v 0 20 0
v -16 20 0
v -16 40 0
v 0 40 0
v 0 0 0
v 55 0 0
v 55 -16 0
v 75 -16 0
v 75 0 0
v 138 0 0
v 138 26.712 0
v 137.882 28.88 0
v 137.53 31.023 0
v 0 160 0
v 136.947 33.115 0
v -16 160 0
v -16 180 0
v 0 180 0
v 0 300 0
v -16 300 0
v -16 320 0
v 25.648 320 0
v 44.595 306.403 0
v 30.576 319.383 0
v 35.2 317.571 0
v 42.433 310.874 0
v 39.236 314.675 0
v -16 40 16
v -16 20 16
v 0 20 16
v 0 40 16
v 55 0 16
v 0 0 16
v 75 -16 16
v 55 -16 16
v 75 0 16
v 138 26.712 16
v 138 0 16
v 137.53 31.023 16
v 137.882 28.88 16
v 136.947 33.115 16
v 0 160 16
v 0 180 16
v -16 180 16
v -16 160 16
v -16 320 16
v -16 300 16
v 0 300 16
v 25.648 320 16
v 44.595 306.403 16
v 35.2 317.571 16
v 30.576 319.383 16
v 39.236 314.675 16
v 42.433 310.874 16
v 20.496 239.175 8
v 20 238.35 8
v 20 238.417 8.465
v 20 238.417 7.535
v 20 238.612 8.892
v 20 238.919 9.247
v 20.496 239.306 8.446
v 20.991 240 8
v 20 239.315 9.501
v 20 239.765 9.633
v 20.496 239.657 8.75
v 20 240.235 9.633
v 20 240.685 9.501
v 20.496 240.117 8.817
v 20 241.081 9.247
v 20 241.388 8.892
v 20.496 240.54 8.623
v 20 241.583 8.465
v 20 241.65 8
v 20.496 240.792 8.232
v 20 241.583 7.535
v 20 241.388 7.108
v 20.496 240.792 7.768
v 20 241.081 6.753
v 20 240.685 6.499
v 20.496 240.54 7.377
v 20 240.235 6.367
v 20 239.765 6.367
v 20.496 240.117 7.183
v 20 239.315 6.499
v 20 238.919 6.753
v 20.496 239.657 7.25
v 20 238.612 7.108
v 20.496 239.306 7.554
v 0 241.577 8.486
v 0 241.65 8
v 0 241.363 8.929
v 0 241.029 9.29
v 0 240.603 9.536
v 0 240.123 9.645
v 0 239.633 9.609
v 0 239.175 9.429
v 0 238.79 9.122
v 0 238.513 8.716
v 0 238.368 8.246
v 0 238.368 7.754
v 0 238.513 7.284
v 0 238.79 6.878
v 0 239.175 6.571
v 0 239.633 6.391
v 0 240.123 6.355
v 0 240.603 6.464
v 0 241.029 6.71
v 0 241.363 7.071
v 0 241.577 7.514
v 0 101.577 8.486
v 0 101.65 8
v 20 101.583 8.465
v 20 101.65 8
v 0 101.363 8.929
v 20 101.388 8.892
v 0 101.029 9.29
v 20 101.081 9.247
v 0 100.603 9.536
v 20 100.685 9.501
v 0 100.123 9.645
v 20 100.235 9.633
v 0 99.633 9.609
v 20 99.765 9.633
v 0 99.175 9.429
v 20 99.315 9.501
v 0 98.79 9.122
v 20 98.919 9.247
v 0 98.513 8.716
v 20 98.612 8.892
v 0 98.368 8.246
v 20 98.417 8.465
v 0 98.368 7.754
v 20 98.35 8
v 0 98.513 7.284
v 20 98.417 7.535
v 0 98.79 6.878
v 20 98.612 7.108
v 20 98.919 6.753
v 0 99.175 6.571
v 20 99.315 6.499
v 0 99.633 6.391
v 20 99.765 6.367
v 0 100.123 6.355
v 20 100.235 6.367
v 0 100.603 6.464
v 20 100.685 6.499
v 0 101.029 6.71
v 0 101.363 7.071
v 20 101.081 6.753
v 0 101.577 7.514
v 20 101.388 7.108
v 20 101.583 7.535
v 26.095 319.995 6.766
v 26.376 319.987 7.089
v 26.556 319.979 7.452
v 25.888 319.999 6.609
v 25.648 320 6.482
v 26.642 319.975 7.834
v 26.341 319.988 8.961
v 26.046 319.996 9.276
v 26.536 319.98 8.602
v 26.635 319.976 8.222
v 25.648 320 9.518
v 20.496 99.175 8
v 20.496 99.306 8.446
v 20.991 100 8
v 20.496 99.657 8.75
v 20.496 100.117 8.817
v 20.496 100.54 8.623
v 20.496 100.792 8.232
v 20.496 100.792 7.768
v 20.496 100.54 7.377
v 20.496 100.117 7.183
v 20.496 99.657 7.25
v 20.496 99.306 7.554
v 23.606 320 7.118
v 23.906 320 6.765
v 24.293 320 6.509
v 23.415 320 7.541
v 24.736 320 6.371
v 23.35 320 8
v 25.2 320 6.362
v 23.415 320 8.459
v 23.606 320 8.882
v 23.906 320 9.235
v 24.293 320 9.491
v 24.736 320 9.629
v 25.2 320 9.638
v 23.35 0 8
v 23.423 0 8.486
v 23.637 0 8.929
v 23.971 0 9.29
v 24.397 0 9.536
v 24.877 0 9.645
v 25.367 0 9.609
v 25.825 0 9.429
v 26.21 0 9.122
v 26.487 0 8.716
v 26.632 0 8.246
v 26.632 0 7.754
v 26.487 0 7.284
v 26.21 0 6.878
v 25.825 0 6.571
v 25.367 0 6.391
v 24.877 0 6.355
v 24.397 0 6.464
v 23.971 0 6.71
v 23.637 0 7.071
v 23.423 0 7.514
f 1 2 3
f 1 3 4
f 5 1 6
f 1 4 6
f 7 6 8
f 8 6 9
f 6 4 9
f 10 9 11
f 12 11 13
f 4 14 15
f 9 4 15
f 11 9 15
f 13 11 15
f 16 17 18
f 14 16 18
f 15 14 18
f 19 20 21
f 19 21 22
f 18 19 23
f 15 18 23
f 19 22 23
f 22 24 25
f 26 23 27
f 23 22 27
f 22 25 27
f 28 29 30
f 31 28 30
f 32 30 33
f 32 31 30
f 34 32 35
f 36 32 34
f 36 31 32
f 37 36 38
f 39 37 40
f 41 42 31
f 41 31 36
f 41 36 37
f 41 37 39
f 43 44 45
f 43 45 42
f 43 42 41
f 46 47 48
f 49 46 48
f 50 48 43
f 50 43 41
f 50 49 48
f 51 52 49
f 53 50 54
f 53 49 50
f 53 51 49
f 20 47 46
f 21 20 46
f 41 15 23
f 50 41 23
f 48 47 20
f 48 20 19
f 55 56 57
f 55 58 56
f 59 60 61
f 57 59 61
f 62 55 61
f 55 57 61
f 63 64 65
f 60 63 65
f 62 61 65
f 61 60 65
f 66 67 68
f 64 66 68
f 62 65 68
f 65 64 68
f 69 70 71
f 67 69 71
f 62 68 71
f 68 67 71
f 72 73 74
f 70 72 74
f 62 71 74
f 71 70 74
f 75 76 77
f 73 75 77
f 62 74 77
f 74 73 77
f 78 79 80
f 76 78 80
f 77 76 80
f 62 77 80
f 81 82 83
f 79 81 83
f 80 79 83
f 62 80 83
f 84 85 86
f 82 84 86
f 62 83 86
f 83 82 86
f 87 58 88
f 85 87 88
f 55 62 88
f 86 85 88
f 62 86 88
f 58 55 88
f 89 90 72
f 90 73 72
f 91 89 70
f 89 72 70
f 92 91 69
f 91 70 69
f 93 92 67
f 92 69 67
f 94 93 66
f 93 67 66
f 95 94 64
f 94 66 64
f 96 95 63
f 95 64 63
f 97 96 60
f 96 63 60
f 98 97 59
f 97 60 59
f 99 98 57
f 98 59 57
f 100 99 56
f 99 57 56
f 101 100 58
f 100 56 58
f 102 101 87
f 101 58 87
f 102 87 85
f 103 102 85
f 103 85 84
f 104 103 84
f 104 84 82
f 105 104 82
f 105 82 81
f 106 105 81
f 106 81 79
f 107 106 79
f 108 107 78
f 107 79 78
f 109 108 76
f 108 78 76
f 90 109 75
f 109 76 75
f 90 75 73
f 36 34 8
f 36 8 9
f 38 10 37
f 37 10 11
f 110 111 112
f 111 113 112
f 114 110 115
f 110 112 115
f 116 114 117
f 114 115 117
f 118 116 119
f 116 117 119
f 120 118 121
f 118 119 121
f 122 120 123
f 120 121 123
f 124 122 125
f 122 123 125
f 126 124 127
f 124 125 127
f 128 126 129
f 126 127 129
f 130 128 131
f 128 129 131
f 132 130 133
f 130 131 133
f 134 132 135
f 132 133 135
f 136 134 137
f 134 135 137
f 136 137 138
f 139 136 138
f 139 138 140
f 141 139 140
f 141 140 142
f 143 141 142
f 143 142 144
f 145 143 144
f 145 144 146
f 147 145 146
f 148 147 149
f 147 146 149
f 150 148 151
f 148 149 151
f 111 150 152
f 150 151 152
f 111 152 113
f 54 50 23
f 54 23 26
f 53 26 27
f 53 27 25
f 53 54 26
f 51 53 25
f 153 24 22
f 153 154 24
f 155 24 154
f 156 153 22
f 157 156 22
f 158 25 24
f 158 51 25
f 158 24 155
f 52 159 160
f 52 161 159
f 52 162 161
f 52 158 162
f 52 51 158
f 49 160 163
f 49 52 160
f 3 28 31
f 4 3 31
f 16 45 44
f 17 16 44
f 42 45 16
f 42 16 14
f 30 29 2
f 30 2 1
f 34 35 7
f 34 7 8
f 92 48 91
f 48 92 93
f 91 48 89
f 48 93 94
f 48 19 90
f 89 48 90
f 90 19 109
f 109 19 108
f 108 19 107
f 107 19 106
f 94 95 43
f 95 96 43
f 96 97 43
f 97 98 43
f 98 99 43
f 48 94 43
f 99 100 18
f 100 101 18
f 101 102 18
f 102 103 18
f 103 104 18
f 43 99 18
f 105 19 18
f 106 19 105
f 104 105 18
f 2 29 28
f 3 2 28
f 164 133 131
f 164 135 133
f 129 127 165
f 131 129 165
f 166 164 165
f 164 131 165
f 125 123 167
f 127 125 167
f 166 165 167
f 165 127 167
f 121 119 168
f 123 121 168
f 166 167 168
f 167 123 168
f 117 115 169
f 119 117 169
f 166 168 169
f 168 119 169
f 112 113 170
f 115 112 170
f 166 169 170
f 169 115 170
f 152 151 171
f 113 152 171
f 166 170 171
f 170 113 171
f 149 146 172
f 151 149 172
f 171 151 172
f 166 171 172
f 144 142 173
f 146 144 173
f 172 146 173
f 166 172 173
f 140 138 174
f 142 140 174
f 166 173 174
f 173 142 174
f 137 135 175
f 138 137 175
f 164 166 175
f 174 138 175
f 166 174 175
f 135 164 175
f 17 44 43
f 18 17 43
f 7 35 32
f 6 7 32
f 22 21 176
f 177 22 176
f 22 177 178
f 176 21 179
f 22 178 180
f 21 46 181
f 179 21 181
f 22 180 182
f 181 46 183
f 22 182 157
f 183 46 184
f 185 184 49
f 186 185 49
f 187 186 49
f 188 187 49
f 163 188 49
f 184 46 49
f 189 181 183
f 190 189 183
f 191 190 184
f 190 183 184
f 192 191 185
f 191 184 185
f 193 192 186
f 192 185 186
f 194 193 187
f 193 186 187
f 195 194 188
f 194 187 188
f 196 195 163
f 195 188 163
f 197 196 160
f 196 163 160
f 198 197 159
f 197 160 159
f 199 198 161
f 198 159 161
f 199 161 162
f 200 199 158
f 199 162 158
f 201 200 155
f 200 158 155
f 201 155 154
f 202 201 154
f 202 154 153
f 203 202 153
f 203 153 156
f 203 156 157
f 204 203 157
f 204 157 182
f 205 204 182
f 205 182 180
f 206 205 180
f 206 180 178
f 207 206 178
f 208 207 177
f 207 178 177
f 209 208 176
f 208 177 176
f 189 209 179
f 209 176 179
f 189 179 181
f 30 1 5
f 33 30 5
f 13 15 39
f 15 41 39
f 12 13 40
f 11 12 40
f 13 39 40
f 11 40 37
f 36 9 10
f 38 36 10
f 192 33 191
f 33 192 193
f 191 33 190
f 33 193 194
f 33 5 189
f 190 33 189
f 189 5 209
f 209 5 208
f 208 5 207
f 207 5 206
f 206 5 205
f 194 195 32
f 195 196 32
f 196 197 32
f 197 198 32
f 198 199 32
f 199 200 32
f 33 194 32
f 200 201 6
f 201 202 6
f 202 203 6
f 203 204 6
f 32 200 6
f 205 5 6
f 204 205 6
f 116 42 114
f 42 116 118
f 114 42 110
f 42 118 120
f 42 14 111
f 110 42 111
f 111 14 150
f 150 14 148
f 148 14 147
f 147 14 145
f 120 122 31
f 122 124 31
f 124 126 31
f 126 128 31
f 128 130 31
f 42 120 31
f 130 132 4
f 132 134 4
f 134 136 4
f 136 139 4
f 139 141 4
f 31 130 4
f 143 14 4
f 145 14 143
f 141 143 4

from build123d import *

# Parameters (mm, degrees)
F1_DEPTH = 16
F2_W     = 16
F2_H     = 20
F2_W_2   = 20
F2_H_2   = 16
F3_DEPTH = 16
F4_R     = 20
F6_D     = 3.3
F6_DEPTH = 20
F6_TIP   = 0.9914200214
F8_D     = 3.3


with BuildPart() as f1:
    # F0 (on Top) → F1 (new body)
    with BuildSketch(Plane.XY):
        Polygon((0, 320), (0, 0), (138, 0), (138, 30), (40, 320), align=None)
    extrude(amount=F1_DEPTH)

    # F2 (on face) → F3 (join, through all)
    with BuildSketch(Plane.XY.offset(16)):
        with Locations((-8, 310)):
            Rectangle(F2_W, F2_H)
        with Locations((-8, 170)):
            Rectangle(F2_W, F2_H)
        with Locations((65, -8)):
            Rectangle(F2_W_2, F2_H_2)
        with Locations((-8, 30)):
            Rectangle(F2_W, F2_H)
    extrude(amount=-F3_DEPTH)

    # F4
    f4_edges = [f1.edges().sort_by_distance(p)[0] for p in [
        (40, 320, 8),
        (138, 30, 8),
    ]]
    fillet(f4_edges, radius=F4_R)

    # F6
    with Locations(Plane(origin=(0, 0, 0), x_dir=(0, -1, 0), z_dir=(-1, 0, 0))):
        with Locations((-240, 8), (-100, 8)):
            Hole(F6_D / 2, depth=F6_DEPTH)
            with Locations((0, 0, -(F6_DEPTH + F6_TIP / 2))):  # 118° drill point
                Cone(0, F6_D / 2, F6_TIP, mode=Mode.SUBTRACT)

    # F8 (through all)
    with Locations(Plane.XZ):
        with Locations((25, 8)):
            Hole(F8_D / 2)


solid = f1.part
